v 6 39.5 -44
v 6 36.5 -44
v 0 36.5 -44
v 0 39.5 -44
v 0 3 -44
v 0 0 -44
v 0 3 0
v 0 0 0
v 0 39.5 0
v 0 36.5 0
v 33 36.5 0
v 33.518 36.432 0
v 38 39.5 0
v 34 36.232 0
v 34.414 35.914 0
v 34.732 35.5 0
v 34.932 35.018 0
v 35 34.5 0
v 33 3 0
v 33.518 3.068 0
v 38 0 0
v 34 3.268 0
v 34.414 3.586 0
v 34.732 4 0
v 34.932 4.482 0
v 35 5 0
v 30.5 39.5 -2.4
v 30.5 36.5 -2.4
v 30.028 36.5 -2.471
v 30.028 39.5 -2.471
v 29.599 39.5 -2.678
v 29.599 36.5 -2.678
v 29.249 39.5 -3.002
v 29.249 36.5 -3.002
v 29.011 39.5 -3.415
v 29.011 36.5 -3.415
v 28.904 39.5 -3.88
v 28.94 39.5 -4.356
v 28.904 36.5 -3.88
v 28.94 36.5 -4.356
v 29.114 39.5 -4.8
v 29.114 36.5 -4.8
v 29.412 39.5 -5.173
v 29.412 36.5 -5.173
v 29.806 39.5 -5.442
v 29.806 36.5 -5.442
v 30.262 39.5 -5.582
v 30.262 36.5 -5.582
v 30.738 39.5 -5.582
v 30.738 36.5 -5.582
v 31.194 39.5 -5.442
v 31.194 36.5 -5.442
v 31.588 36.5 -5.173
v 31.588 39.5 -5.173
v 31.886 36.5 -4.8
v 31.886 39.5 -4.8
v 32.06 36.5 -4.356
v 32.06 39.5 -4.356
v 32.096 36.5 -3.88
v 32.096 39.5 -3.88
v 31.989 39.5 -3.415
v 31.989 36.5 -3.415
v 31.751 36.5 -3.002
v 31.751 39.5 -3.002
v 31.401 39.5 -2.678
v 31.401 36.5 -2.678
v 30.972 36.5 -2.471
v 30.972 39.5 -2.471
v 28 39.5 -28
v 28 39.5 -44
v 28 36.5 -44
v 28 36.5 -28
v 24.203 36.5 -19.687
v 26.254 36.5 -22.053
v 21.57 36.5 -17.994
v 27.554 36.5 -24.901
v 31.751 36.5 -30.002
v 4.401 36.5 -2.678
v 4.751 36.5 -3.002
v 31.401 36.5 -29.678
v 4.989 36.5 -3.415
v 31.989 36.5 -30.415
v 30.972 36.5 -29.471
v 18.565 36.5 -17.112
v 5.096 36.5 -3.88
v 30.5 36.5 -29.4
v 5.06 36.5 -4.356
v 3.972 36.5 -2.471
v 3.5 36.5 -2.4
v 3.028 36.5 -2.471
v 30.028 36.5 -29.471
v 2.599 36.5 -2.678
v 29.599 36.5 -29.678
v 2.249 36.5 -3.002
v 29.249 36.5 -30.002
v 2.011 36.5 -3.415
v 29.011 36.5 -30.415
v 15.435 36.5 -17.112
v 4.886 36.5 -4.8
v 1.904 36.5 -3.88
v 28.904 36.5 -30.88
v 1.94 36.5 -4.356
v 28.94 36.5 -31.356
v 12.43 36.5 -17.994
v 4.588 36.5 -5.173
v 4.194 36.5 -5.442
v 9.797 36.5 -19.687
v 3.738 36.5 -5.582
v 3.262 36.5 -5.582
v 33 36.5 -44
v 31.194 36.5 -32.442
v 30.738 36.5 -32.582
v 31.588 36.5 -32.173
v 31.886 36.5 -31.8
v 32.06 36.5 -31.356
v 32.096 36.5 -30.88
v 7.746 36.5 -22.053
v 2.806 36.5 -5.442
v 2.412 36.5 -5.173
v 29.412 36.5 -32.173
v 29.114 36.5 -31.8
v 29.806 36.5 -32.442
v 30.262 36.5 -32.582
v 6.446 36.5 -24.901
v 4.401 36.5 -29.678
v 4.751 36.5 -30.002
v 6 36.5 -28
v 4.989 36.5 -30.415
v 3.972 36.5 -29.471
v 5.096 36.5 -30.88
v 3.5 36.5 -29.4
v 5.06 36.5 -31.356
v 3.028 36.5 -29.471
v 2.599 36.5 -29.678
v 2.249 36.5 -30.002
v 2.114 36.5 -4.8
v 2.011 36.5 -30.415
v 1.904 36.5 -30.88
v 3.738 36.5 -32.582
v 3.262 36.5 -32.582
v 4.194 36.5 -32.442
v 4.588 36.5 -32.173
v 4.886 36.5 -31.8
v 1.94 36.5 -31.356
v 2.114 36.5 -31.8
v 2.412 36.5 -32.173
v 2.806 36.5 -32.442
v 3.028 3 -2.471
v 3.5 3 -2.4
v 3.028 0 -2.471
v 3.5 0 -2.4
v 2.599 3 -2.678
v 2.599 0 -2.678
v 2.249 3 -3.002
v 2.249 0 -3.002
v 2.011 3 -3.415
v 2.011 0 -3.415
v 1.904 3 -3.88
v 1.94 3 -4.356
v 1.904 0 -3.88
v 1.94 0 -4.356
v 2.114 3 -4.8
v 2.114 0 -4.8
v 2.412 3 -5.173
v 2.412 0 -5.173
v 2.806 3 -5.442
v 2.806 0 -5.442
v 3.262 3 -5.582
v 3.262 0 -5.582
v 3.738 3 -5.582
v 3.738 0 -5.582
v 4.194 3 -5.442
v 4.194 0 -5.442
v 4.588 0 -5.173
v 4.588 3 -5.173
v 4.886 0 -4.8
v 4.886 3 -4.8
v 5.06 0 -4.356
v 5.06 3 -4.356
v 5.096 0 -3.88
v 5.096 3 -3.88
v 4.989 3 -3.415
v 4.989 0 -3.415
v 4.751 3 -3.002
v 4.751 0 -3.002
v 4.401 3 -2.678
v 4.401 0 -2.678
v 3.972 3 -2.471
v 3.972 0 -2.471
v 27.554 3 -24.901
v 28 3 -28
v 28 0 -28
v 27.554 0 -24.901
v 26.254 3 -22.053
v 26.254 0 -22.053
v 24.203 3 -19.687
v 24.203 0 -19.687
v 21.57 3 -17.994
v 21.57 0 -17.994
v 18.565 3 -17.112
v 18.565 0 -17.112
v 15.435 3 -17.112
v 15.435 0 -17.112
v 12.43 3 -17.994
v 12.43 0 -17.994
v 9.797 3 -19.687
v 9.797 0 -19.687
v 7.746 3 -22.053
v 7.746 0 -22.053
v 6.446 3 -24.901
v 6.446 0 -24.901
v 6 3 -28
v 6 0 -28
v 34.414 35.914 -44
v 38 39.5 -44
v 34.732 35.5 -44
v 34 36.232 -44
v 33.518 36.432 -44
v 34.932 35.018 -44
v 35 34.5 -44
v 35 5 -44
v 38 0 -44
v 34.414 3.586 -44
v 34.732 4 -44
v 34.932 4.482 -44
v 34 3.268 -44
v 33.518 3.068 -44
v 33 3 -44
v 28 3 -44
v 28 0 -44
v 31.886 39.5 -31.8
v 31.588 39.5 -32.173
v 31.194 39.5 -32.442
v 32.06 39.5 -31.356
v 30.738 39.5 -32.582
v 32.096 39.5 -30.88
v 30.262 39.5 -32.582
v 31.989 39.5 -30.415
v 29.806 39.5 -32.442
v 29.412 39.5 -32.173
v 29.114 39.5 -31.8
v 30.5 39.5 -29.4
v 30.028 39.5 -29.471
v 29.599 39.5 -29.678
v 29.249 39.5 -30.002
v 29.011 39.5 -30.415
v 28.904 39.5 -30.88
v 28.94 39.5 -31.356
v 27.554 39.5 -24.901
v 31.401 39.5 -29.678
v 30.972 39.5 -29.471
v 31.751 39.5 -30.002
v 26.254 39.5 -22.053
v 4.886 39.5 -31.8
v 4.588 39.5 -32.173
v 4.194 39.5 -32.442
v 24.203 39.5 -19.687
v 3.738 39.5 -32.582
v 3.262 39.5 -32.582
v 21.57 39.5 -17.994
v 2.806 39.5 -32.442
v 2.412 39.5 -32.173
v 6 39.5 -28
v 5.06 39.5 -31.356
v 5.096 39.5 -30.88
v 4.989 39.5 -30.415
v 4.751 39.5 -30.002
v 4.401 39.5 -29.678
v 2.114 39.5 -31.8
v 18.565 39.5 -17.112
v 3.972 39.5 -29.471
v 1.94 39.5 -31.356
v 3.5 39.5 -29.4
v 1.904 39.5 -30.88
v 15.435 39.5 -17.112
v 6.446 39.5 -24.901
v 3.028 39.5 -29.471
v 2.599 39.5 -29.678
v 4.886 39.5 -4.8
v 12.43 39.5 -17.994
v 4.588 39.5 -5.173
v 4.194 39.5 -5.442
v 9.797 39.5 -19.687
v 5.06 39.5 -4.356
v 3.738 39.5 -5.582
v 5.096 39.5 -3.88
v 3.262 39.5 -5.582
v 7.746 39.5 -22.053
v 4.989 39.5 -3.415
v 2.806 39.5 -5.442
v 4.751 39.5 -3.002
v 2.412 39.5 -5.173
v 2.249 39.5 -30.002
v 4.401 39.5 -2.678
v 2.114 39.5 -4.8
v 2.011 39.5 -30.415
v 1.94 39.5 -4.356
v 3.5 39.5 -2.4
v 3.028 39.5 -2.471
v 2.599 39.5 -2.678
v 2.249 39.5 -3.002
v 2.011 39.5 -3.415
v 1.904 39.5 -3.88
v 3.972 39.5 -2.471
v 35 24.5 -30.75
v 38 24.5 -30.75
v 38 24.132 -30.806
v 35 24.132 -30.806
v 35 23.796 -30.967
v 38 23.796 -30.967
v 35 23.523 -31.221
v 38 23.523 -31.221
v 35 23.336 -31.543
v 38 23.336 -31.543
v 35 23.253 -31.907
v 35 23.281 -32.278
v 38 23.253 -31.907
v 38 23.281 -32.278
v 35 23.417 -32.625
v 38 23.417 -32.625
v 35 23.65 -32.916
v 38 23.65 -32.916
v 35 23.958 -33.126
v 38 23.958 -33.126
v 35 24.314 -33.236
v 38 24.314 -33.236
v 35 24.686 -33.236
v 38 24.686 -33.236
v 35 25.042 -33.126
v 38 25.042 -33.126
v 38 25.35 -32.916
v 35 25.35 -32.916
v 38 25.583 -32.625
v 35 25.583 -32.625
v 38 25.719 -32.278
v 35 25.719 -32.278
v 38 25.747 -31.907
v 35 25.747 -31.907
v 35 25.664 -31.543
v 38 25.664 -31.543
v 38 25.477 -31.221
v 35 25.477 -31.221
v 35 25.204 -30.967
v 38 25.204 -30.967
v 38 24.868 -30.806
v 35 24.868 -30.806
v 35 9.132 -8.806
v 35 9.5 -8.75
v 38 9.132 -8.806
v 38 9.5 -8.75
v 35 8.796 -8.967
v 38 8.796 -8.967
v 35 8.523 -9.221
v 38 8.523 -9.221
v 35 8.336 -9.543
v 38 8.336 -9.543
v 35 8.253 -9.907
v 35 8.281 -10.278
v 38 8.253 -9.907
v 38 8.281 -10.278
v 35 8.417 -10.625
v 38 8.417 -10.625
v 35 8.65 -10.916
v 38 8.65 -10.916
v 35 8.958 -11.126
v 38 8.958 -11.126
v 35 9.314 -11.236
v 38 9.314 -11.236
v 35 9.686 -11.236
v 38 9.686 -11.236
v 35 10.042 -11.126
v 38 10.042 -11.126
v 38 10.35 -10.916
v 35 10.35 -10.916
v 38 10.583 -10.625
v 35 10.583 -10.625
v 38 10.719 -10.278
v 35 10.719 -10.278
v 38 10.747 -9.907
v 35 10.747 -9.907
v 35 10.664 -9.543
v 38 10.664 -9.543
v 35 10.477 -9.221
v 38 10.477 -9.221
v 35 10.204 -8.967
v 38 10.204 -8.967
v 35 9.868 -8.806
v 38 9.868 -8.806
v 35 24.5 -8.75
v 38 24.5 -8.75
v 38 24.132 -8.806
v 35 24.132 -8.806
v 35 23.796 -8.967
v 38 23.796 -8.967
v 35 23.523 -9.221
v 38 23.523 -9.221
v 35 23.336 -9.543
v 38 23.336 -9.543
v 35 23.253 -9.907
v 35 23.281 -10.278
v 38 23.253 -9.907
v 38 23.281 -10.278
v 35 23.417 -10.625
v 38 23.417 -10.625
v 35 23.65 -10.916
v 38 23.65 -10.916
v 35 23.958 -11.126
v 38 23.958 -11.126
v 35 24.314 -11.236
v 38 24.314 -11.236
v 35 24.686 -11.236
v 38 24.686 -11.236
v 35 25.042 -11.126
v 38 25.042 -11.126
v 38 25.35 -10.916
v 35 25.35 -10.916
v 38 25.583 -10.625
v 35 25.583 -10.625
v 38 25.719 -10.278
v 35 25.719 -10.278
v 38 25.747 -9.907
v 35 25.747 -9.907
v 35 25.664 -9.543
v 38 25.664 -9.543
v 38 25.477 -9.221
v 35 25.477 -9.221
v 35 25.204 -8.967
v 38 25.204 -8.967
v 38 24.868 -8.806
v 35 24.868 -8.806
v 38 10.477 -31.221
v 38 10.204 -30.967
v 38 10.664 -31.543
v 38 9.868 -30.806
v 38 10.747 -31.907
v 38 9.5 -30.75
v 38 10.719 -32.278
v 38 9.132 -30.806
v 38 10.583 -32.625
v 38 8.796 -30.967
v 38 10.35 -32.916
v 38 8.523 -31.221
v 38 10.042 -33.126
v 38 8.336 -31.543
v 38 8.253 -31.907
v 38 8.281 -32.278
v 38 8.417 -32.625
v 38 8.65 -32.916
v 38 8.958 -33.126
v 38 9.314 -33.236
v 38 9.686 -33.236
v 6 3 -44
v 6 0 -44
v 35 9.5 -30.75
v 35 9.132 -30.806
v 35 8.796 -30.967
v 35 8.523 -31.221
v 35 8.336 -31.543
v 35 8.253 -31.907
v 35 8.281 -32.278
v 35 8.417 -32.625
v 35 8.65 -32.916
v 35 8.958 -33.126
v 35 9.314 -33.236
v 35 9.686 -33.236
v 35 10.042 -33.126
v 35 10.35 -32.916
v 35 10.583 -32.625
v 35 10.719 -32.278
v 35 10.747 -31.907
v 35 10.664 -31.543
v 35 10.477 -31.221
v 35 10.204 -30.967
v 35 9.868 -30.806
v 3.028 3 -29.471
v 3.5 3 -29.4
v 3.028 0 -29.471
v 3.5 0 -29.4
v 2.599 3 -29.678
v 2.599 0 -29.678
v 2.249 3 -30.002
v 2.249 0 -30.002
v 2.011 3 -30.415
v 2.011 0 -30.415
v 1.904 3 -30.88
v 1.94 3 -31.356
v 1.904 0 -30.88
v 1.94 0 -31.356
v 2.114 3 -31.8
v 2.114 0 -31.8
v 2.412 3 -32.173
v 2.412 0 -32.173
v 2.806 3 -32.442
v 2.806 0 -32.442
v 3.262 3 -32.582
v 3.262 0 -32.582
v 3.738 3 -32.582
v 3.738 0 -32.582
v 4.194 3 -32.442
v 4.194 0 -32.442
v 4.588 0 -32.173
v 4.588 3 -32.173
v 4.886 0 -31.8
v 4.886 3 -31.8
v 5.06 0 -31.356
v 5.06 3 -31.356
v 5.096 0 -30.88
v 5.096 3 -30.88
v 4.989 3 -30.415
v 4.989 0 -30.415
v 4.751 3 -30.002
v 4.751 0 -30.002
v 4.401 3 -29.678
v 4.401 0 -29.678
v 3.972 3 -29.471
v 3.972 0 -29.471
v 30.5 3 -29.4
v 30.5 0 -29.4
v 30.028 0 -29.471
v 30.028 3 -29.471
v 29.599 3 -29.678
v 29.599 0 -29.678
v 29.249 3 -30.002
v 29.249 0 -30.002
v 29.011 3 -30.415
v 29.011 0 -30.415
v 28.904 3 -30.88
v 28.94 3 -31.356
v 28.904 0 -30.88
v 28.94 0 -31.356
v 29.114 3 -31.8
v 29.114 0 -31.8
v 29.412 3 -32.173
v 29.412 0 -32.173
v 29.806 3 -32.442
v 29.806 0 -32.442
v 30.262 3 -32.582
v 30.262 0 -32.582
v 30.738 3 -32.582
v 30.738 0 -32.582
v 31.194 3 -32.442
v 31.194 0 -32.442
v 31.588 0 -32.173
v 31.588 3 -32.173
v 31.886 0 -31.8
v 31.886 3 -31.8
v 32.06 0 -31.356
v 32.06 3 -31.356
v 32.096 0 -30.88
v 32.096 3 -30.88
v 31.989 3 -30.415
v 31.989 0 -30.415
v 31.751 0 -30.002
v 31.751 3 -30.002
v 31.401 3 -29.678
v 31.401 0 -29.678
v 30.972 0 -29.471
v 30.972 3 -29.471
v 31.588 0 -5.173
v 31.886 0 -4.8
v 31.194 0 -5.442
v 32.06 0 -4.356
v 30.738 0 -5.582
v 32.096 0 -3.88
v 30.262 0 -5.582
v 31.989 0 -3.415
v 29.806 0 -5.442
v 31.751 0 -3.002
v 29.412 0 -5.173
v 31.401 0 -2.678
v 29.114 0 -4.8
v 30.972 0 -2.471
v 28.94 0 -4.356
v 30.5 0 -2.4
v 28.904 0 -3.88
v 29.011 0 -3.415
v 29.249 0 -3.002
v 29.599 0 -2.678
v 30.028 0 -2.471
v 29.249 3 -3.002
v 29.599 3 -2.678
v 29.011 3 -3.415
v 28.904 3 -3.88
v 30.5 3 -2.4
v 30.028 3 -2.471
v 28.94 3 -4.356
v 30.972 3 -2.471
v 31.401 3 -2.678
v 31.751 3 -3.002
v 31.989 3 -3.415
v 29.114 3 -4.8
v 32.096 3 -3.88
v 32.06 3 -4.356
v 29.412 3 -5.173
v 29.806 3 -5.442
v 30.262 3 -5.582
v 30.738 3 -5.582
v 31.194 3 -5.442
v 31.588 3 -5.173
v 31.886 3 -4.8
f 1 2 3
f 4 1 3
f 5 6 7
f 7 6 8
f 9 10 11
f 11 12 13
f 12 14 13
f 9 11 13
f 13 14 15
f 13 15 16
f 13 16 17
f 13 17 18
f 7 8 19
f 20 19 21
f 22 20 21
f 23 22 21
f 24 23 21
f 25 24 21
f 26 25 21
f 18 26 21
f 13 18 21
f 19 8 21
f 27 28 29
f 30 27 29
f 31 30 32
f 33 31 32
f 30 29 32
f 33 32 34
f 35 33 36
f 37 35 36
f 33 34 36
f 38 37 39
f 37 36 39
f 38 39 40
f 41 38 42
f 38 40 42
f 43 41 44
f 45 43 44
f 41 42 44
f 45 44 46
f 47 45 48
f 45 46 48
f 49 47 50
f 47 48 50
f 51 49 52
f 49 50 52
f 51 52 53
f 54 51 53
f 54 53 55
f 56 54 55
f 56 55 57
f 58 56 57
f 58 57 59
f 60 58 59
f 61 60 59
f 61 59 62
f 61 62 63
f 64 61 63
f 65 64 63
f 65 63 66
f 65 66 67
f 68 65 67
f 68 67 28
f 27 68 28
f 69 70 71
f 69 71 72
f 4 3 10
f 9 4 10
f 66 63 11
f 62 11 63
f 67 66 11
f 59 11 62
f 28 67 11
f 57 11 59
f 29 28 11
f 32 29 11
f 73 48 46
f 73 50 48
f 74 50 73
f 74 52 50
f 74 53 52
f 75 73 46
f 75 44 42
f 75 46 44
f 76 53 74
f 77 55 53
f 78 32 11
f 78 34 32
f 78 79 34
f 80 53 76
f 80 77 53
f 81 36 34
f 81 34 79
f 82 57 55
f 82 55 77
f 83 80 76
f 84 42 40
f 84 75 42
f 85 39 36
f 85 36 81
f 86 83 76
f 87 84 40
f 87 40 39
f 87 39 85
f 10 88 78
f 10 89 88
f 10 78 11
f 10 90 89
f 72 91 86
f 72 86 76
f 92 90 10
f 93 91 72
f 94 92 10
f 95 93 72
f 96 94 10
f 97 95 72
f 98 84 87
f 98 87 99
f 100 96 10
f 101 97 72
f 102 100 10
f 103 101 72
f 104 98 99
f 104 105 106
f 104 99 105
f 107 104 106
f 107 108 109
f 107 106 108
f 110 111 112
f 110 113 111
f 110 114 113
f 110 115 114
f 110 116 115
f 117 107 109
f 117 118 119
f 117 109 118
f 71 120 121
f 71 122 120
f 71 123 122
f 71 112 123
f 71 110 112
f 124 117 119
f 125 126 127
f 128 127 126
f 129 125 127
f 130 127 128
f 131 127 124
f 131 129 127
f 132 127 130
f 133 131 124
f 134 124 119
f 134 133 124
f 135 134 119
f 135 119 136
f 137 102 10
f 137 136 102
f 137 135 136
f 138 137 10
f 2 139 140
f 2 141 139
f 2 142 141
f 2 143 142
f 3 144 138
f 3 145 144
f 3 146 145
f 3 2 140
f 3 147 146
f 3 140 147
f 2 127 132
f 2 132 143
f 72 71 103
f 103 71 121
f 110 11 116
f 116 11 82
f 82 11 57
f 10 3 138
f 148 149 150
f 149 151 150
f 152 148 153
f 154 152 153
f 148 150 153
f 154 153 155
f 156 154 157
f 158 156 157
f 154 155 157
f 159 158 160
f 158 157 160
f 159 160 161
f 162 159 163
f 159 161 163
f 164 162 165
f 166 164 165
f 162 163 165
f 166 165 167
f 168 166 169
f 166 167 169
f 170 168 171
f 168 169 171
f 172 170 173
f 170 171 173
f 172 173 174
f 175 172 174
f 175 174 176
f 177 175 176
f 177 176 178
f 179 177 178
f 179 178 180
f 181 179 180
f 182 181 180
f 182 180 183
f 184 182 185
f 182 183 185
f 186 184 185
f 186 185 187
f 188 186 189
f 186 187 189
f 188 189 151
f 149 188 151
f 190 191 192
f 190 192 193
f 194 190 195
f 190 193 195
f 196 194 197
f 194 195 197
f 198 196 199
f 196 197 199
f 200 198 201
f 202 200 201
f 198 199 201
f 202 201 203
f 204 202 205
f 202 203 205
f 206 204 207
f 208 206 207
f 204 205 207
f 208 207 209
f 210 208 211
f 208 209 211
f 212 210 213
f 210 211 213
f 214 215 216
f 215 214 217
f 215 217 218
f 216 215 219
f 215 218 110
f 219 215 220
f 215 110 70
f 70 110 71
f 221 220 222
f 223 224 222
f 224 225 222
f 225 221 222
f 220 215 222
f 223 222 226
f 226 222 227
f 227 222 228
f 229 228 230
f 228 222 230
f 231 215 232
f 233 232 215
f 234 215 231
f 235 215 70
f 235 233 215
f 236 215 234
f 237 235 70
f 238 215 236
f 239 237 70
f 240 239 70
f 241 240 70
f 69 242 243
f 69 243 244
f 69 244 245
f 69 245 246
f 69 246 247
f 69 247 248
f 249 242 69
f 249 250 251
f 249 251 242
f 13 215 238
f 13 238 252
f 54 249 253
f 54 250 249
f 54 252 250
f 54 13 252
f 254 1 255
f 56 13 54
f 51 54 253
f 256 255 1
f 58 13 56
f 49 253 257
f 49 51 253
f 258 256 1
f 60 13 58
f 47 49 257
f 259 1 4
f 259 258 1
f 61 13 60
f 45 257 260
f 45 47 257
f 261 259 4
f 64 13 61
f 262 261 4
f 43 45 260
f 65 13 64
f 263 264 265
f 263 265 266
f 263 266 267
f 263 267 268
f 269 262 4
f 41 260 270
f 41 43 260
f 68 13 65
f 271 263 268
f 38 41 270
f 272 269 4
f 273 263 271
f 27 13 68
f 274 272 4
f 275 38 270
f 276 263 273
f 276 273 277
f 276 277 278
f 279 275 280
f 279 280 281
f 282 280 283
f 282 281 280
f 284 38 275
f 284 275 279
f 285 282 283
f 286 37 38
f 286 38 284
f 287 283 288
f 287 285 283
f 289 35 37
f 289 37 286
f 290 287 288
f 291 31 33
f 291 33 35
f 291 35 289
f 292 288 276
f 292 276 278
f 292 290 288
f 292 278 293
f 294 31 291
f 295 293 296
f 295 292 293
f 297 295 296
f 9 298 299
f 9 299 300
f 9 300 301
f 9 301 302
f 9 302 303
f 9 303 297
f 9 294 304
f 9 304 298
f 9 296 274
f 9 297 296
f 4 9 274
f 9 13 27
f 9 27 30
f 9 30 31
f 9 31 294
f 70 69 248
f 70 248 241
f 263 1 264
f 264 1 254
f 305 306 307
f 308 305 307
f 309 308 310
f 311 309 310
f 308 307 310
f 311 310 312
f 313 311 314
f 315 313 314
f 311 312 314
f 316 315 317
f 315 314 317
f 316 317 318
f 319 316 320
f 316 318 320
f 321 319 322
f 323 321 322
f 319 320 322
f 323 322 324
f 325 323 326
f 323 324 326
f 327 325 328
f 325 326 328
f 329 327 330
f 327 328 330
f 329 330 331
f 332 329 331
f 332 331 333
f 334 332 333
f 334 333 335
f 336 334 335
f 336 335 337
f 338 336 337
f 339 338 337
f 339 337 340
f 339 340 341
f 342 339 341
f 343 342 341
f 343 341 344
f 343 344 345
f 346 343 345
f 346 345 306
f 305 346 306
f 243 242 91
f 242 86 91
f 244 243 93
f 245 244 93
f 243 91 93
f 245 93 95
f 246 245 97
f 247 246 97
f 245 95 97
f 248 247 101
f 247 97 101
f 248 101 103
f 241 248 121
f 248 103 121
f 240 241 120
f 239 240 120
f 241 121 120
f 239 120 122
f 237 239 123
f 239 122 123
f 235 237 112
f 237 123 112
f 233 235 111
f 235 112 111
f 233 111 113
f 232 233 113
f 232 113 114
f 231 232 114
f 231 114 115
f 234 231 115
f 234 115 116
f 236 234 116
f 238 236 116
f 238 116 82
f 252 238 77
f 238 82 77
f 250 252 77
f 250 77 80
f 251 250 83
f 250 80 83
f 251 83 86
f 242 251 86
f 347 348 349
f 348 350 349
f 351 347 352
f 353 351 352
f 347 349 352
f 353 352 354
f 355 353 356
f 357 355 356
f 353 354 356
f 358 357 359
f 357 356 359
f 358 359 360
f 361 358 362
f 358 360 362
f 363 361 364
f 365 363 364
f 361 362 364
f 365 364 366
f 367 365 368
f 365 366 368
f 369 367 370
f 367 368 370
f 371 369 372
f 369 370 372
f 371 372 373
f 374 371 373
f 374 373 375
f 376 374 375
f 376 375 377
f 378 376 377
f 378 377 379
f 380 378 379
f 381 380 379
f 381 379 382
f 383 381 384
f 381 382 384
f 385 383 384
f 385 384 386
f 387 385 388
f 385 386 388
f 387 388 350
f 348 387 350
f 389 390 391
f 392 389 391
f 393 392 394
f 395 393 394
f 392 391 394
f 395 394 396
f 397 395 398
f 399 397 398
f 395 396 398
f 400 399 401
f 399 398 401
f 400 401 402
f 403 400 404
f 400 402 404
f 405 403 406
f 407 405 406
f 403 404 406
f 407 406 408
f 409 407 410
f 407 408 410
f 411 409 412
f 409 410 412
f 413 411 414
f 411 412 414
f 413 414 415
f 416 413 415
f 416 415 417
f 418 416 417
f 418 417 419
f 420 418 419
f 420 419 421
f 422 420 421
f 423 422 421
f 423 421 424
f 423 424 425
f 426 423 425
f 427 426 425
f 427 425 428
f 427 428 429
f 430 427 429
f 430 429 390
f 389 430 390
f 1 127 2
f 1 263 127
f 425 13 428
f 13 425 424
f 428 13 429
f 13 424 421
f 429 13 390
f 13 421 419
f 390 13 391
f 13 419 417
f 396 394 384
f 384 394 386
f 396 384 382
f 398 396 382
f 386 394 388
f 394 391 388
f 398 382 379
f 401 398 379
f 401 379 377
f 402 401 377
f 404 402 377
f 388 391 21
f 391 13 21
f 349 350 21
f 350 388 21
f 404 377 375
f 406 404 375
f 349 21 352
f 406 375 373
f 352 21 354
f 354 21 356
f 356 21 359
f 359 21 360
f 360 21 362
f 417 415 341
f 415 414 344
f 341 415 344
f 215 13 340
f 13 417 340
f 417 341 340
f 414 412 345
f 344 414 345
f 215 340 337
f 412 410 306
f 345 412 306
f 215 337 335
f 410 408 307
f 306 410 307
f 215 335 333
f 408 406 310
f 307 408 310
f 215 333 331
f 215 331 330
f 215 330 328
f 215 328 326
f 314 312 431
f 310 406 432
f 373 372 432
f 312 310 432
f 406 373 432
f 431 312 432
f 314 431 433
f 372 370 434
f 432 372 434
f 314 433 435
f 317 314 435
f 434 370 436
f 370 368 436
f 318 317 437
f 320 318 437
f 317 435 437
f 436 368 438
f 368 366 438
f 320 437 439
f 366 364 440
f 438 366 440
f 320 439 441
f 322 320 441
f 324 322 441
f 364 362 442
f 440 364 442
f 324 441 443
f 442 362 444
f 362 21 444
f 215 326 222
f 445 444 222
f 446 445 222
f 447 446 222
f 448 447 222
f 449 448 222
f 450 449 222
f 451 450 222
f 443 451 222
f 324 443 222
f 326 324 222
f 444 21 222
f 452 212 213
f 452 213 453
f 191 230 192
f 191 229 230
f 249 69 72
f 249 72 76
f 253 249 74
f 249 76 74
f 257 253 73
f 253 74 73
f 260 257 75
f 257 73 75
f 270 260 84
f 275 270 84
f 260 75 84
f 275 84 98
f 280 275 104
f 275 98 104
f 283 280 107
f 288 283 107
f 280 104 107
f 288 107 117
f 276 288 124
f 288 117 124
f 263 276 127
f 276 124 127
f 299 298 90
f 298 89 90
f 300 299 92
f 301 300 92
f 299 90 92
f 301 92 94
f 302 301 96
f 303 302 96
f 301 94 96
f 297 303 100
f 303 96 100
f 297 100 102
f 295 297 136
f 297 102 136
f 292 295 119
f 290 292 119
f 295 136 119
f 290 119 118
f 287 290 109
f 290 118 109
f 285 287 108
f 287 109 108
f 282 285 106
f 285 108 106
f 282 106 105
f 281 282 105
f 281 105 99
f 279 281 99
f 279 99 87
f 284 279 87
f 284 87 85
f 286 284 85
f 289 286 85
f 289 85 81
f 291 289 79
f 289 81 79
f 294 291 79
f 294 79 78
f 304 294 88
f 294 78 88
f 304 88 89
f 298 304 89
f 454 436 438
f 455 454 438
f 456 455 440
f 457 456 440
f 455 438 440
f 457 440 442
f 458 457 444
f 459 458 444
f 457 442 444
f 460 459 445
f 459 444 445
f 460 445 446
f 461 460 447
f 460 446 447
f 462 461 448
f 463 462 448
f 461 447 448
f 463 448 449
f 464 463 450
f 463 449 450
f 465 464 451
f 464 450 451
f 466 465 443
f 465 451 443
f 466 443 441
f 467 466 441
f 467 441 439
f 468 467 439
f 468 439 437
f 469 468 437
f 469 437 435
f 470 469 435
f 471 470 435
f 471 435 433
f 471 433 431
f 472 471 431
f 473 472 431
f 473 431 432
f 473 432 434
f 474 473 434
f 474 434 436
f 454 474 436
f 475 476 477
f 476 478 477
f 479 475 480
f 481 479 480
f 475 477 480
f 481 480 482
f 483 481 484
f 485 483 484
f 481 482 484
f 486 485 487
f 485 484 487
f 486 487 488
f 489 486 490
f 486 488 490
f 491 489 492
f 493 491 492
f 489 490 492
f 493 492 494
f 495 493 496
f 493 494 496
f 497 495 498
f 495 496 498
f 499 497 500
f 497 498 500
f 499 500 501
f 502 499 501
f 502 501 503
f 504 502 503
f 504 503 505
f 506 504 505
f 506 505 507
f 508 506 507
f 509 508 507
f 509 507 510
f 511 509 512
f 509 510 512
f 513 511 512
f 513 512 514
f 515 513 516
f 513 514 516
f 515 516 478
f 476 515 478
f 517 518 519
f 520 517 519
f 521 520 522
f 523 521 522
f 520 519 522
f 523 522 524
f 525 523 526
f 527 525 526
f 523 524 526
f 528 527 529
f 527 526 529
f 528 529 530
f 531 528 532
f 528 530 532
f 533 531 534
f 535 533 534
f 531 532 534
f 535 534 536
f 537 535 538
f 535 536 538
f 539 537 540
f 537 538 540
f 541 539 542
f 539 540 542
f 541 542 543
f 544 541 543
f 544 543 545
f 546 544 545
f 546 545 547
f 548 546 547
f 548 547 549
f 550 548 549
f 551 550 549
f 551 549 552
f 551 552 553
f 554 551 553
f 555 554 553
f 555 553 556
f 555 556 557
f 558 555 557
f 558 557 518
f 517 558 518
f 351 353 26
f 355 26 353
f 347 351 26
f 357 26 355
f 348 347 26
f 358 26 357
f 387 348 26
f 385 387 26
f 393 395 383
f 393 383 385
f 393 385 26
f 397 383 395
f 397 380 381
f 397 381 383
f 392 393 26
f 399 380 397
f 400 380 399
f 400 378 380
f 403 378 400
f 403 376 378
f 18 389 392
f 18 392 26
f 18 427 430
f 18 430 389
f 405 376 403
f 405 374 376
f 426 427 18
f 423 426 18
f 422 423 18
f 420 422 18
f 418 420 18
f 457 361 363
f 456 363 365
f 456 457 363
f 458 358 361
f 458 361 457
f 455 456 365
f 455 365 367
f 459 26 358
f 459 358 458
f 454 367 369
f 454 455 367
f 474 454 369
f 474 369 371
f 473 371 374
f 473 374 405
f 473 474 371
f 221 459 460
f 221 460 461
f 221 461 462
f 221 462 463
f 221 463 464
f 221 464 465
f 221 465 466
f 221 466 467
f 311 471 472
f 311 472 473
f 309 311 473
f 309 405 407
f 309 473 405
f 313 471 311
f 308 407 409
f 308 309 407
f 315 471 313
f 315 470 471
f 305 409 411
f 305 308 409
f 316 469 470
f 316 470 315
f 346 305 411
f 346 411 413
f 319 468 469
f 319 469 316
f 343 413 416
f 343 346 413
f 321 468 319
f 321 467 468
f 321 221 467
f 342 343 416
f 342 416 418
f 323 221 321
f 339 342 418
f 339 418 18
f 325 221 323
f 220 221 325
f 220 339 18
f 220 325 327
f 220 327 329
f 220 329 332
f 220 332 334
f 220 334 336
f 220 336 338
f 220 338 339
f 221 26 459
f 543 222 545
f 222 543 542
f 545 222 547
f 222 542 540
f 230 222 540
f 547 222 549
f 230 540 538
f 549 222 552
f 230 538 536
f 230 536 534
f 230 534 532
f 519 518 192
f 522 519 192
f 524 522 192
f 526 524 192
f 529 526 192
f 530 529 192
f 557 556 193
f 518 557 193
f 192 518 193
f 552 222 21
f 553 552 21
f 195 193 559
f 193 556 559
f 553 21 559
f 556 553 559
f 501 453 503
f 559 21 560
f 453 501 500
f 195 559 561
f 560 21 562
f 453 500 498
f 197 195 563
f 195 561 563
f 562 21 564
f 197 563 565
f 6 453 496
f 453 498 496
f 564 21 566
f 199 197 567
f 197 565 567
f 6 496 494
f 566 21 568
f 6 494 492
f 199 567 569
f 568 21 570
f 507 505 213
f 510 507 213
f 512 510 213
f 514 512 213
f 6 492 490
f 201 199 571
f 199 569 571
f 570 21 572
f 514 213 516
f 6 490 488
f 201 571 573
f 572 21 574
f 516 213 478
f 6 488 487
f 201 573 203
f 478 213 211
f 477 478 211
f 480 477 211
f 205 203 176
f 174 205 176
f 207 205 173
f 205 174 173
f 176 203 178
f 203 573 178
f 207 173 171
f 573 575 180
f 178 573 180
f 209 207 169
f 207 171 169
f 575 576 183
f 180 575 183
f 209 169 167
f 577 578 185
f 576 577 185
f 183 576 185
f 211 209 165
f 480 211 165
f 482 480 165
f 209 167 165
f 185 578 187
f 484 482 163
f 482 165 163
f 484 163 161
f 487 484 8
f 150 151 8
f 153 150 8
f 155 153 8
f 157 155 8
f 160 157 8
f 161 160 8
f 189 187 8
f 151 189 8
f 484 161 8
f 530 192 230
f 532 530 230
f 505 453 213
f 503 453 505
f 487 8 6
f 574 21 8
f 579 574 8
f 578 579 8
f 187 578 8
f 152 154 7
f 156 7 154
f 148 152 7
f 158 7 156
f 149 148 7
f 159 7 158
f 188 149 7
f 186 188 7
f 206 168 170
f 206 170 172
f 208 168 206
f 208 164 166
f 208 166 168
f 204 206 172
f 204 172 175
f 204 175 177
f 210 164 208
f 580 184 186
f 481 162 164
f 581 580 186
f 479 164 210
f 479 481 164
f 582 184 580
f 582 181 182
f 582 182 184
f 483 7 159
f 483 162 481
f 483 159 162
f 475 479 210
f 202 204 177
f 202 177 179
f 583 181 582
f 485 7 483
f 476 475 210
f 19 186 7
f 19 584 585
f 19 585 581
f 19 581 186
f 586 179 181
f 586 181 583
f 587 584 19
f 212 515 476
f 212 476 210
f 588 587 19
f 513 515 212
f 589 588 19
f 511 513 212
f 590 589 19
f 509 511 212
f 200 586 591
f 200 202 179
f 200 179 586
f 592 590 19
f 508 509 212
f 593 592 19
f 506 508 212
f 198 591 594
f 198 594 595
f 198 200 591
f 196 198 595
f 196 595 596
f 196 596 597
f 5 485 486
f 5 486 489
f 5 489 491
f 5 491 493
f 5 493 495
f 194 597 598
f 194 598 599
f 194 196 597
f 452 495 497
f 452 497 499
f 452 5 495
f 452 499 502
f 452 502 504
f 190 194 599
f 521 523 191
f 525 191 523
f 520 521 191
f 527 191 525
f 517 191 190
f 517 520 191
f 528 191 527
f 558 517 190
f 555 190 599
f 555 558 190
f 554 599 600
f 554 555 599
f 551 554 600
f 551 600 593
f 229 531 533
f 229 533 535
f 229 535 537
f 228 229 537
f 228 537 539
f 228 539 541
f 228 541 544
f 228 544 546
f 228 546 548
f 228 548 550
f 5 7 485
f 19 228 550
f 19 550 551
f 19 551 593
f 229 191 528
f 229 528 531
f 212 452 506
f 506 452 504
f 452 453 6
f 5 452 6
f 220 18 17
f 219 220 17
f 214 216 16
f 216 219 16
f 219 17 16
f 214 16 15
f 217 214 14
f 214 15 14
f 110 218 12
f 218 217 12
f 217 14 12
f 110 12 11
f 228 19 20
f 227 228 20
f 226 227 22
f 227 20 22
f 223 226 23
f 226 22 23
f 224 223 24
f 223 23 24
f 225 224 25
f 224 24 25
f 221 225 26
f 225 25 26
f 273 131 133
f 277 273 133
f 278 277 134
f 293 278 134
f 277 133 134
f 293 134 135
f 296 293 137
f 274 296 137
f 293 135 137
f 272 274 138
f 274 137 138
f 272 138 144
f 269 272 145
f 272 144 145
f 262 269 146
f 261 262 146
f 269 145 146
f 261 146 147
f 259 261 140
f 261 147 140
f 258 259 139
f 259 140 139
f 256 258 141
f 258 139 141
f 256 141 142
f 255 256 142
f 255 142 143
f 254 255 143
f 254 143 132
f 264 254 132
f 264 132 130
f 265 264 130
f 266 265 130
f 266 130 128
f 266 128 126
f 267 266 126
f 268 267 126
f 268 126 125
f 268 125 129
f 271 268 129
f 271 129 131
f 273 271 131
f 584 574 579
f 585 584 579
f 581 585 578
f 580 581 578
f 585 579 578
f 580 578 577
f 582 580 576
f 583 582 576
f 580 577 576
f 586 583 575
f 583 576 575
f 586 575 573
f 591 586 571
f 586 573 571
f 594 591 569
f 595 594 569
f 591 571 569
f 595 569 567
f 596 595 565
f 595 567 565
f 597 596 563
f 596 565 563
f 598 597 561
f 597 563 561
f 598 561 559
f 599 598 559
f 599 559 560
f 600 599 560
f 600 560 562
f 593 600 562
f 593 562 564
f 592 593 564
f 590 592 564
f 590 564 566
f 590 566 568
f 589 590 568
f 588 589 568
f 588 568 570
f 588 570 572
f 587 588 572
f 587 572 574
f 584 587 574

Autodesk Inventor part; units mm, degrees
ref_plane "YZ Plane" through (0, 0, 0) normal (1, 0, 0) x (0, 1, 0)
ref_plane "XZ Plane" through (0, 0, 0) normal (0, 1, 0) x (-1, 0, 0)
ref_plane "XY Plane" through (0, 0, 0) normal (0, 0, 1) x (1, 0, 0)
sketch "スケッチ1" plane through (0, 0, 0) normal (0, 1, 0) x (-1, 0, 0)
  line L0 (0, 0) -> (-38, 0)
  line L1 (-38, 0) -> (-38, -44)
  line L2 (-38, -44) -> (0, -44)
  line L3 (0, -44) -> (0, 0)
  dimension "d0" = 44
  dimension "d1" = 38
extrude "押し出し1" add sketch "スケッチ1" along normal blind 39.5
sketch "スケッチ2" plane through (38, 0, -44) normal (0, 0, -1) x (-1, 0, 0)
  line L0 (3, 36.5) -> (59.072, 36.5)
  line L1 (59.072, 36.5) -> (59.072, 3)
  line L2 (59.072, 3) -> (3, 3)
  line L3 (3, 3) -> (3, 36.5)
  line L4 (0, 39.5) -> (38, 39.5) projected
  line L5 (0, 0) -> (38, 0) projected
  line L6 (0, 0) -> (0, 39.5) projected
  dimension "d4" = 33.5
  dimension "d6" = 3
  dimension "d7" = 3
extrude "押し出し2" cut sketch "スケッチ2" against normal blind 100
sketch "スケッチ3" plane through (0, 39.5, 0) normal (0, 1, 0) x (1, 0, 0)
  line L0 (38, 44) -> (0, 44) projected
  line L1 (38, 0) -> (38, 44) projected
  point P0 (0, 0)
  point P1 (17, 28)
  dimension "d10" = 16
  dimension "d11" = 21
hole "穴1" at (17, 39.5, -28) direction (0, -1, 0) diameter 22 end through all
sketch "スケッチ4" plane through (0, 39.5, 0) normal (0, 1, 0) x (1, 0, 0)
  line L0 (0, 0) -> (38, 0) projected
  line L1 (38, 0) -> (38, 44) projected
  point P0 (30.5, 4)
  point P1 (30.5, 31)
  point P2 (3.5, 4)
  point P3 (3.5, 31)
  point P4 (3.5, 4)
  dimension "d19" = 4
  dimension "d20" = 7.5
  dimension "d23" = 27
  dimension "d26" = 27
hole "穴2" at (30.5, 39.5, -4) at (30.5, 39.5, -31) at (3.5, 39.5, -31) at (3.5, 39.5, -4) direction (0, -1, 0) diameter 3.2 end through all
fillet "フィレット1" radius 2 2 edges at (35, 3, -22) (35, 36.5, -22)
sketch "スケッチ7" plane through (0, 39.5, 0) normal (0, 1, 0) x (1, 0, 0)
  line L0 (38, 44) -> (0, 44) projected
  line L1 (6, 44) -> (28, 44)
  line L2 (28, 44) -> (28, 28)
  line L3 (28, 28) -> (6, 28)
  line L4 (6, 28) -> (6, 44)
  circle A0 centre (17, 28) radius 11 projected
  point P0 (0, 0)
  point P1 (28, 28)
  point P2 (28, 44)
  dimension "d69" = 22
  dimension "d70" = 11
  dimension "d84" = 0
extrude "押し出し3" cut sketch "スケッチ7" against normal through all contours L2 A0 L4 L0
sketch "スケッチ8" plane through (35, 5, -44) normal (-1, 0, 0) x (0, 0, 1)
  line L0 (12, 4.5) -> (34, 4.5)
  line L1 (34, 4.5) -> (34, 19.5)
  line L2 (34, 19.5) -> (12, 19.5)
  line L3 (12, 19.5) -> (12, 4.5)
  line L4 (44, 34.5) -> (44, 0) projected
  line L5 (44, 34.5) -> (0, 34.5) projected
  point P0 (44, -5)
  point P1 (44, 29.5)
  dimension "d73" = 10
  dimension "d74" = 22
  dimension "d75" = 15
  dimension "d76" = 15
hole "穴5" at (35, 9.5, -10) at (35, 9.5, -32) at (35, 24.5, -32) at (35, 24.5, -10) direction (1, 0, 0) diameter 2.5 end through all
properties part number "サーボモータ固定用２軸目3mm改_printer"
